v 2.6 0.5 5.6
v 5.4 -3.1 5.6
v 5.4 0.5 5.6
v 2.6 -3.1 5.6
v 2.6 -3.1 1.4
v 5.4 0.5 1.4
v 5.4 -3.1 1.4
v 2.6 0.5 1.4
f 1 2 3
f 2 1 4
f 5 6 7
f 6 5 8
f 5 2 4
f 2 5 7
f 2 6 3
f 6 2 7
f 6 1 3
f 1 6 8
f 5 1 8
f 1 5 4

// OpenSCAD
union() {
  translate([2.6, -3.1, 1.4]) cube(size=[2.8,3.6,4.2], center=false);
}
